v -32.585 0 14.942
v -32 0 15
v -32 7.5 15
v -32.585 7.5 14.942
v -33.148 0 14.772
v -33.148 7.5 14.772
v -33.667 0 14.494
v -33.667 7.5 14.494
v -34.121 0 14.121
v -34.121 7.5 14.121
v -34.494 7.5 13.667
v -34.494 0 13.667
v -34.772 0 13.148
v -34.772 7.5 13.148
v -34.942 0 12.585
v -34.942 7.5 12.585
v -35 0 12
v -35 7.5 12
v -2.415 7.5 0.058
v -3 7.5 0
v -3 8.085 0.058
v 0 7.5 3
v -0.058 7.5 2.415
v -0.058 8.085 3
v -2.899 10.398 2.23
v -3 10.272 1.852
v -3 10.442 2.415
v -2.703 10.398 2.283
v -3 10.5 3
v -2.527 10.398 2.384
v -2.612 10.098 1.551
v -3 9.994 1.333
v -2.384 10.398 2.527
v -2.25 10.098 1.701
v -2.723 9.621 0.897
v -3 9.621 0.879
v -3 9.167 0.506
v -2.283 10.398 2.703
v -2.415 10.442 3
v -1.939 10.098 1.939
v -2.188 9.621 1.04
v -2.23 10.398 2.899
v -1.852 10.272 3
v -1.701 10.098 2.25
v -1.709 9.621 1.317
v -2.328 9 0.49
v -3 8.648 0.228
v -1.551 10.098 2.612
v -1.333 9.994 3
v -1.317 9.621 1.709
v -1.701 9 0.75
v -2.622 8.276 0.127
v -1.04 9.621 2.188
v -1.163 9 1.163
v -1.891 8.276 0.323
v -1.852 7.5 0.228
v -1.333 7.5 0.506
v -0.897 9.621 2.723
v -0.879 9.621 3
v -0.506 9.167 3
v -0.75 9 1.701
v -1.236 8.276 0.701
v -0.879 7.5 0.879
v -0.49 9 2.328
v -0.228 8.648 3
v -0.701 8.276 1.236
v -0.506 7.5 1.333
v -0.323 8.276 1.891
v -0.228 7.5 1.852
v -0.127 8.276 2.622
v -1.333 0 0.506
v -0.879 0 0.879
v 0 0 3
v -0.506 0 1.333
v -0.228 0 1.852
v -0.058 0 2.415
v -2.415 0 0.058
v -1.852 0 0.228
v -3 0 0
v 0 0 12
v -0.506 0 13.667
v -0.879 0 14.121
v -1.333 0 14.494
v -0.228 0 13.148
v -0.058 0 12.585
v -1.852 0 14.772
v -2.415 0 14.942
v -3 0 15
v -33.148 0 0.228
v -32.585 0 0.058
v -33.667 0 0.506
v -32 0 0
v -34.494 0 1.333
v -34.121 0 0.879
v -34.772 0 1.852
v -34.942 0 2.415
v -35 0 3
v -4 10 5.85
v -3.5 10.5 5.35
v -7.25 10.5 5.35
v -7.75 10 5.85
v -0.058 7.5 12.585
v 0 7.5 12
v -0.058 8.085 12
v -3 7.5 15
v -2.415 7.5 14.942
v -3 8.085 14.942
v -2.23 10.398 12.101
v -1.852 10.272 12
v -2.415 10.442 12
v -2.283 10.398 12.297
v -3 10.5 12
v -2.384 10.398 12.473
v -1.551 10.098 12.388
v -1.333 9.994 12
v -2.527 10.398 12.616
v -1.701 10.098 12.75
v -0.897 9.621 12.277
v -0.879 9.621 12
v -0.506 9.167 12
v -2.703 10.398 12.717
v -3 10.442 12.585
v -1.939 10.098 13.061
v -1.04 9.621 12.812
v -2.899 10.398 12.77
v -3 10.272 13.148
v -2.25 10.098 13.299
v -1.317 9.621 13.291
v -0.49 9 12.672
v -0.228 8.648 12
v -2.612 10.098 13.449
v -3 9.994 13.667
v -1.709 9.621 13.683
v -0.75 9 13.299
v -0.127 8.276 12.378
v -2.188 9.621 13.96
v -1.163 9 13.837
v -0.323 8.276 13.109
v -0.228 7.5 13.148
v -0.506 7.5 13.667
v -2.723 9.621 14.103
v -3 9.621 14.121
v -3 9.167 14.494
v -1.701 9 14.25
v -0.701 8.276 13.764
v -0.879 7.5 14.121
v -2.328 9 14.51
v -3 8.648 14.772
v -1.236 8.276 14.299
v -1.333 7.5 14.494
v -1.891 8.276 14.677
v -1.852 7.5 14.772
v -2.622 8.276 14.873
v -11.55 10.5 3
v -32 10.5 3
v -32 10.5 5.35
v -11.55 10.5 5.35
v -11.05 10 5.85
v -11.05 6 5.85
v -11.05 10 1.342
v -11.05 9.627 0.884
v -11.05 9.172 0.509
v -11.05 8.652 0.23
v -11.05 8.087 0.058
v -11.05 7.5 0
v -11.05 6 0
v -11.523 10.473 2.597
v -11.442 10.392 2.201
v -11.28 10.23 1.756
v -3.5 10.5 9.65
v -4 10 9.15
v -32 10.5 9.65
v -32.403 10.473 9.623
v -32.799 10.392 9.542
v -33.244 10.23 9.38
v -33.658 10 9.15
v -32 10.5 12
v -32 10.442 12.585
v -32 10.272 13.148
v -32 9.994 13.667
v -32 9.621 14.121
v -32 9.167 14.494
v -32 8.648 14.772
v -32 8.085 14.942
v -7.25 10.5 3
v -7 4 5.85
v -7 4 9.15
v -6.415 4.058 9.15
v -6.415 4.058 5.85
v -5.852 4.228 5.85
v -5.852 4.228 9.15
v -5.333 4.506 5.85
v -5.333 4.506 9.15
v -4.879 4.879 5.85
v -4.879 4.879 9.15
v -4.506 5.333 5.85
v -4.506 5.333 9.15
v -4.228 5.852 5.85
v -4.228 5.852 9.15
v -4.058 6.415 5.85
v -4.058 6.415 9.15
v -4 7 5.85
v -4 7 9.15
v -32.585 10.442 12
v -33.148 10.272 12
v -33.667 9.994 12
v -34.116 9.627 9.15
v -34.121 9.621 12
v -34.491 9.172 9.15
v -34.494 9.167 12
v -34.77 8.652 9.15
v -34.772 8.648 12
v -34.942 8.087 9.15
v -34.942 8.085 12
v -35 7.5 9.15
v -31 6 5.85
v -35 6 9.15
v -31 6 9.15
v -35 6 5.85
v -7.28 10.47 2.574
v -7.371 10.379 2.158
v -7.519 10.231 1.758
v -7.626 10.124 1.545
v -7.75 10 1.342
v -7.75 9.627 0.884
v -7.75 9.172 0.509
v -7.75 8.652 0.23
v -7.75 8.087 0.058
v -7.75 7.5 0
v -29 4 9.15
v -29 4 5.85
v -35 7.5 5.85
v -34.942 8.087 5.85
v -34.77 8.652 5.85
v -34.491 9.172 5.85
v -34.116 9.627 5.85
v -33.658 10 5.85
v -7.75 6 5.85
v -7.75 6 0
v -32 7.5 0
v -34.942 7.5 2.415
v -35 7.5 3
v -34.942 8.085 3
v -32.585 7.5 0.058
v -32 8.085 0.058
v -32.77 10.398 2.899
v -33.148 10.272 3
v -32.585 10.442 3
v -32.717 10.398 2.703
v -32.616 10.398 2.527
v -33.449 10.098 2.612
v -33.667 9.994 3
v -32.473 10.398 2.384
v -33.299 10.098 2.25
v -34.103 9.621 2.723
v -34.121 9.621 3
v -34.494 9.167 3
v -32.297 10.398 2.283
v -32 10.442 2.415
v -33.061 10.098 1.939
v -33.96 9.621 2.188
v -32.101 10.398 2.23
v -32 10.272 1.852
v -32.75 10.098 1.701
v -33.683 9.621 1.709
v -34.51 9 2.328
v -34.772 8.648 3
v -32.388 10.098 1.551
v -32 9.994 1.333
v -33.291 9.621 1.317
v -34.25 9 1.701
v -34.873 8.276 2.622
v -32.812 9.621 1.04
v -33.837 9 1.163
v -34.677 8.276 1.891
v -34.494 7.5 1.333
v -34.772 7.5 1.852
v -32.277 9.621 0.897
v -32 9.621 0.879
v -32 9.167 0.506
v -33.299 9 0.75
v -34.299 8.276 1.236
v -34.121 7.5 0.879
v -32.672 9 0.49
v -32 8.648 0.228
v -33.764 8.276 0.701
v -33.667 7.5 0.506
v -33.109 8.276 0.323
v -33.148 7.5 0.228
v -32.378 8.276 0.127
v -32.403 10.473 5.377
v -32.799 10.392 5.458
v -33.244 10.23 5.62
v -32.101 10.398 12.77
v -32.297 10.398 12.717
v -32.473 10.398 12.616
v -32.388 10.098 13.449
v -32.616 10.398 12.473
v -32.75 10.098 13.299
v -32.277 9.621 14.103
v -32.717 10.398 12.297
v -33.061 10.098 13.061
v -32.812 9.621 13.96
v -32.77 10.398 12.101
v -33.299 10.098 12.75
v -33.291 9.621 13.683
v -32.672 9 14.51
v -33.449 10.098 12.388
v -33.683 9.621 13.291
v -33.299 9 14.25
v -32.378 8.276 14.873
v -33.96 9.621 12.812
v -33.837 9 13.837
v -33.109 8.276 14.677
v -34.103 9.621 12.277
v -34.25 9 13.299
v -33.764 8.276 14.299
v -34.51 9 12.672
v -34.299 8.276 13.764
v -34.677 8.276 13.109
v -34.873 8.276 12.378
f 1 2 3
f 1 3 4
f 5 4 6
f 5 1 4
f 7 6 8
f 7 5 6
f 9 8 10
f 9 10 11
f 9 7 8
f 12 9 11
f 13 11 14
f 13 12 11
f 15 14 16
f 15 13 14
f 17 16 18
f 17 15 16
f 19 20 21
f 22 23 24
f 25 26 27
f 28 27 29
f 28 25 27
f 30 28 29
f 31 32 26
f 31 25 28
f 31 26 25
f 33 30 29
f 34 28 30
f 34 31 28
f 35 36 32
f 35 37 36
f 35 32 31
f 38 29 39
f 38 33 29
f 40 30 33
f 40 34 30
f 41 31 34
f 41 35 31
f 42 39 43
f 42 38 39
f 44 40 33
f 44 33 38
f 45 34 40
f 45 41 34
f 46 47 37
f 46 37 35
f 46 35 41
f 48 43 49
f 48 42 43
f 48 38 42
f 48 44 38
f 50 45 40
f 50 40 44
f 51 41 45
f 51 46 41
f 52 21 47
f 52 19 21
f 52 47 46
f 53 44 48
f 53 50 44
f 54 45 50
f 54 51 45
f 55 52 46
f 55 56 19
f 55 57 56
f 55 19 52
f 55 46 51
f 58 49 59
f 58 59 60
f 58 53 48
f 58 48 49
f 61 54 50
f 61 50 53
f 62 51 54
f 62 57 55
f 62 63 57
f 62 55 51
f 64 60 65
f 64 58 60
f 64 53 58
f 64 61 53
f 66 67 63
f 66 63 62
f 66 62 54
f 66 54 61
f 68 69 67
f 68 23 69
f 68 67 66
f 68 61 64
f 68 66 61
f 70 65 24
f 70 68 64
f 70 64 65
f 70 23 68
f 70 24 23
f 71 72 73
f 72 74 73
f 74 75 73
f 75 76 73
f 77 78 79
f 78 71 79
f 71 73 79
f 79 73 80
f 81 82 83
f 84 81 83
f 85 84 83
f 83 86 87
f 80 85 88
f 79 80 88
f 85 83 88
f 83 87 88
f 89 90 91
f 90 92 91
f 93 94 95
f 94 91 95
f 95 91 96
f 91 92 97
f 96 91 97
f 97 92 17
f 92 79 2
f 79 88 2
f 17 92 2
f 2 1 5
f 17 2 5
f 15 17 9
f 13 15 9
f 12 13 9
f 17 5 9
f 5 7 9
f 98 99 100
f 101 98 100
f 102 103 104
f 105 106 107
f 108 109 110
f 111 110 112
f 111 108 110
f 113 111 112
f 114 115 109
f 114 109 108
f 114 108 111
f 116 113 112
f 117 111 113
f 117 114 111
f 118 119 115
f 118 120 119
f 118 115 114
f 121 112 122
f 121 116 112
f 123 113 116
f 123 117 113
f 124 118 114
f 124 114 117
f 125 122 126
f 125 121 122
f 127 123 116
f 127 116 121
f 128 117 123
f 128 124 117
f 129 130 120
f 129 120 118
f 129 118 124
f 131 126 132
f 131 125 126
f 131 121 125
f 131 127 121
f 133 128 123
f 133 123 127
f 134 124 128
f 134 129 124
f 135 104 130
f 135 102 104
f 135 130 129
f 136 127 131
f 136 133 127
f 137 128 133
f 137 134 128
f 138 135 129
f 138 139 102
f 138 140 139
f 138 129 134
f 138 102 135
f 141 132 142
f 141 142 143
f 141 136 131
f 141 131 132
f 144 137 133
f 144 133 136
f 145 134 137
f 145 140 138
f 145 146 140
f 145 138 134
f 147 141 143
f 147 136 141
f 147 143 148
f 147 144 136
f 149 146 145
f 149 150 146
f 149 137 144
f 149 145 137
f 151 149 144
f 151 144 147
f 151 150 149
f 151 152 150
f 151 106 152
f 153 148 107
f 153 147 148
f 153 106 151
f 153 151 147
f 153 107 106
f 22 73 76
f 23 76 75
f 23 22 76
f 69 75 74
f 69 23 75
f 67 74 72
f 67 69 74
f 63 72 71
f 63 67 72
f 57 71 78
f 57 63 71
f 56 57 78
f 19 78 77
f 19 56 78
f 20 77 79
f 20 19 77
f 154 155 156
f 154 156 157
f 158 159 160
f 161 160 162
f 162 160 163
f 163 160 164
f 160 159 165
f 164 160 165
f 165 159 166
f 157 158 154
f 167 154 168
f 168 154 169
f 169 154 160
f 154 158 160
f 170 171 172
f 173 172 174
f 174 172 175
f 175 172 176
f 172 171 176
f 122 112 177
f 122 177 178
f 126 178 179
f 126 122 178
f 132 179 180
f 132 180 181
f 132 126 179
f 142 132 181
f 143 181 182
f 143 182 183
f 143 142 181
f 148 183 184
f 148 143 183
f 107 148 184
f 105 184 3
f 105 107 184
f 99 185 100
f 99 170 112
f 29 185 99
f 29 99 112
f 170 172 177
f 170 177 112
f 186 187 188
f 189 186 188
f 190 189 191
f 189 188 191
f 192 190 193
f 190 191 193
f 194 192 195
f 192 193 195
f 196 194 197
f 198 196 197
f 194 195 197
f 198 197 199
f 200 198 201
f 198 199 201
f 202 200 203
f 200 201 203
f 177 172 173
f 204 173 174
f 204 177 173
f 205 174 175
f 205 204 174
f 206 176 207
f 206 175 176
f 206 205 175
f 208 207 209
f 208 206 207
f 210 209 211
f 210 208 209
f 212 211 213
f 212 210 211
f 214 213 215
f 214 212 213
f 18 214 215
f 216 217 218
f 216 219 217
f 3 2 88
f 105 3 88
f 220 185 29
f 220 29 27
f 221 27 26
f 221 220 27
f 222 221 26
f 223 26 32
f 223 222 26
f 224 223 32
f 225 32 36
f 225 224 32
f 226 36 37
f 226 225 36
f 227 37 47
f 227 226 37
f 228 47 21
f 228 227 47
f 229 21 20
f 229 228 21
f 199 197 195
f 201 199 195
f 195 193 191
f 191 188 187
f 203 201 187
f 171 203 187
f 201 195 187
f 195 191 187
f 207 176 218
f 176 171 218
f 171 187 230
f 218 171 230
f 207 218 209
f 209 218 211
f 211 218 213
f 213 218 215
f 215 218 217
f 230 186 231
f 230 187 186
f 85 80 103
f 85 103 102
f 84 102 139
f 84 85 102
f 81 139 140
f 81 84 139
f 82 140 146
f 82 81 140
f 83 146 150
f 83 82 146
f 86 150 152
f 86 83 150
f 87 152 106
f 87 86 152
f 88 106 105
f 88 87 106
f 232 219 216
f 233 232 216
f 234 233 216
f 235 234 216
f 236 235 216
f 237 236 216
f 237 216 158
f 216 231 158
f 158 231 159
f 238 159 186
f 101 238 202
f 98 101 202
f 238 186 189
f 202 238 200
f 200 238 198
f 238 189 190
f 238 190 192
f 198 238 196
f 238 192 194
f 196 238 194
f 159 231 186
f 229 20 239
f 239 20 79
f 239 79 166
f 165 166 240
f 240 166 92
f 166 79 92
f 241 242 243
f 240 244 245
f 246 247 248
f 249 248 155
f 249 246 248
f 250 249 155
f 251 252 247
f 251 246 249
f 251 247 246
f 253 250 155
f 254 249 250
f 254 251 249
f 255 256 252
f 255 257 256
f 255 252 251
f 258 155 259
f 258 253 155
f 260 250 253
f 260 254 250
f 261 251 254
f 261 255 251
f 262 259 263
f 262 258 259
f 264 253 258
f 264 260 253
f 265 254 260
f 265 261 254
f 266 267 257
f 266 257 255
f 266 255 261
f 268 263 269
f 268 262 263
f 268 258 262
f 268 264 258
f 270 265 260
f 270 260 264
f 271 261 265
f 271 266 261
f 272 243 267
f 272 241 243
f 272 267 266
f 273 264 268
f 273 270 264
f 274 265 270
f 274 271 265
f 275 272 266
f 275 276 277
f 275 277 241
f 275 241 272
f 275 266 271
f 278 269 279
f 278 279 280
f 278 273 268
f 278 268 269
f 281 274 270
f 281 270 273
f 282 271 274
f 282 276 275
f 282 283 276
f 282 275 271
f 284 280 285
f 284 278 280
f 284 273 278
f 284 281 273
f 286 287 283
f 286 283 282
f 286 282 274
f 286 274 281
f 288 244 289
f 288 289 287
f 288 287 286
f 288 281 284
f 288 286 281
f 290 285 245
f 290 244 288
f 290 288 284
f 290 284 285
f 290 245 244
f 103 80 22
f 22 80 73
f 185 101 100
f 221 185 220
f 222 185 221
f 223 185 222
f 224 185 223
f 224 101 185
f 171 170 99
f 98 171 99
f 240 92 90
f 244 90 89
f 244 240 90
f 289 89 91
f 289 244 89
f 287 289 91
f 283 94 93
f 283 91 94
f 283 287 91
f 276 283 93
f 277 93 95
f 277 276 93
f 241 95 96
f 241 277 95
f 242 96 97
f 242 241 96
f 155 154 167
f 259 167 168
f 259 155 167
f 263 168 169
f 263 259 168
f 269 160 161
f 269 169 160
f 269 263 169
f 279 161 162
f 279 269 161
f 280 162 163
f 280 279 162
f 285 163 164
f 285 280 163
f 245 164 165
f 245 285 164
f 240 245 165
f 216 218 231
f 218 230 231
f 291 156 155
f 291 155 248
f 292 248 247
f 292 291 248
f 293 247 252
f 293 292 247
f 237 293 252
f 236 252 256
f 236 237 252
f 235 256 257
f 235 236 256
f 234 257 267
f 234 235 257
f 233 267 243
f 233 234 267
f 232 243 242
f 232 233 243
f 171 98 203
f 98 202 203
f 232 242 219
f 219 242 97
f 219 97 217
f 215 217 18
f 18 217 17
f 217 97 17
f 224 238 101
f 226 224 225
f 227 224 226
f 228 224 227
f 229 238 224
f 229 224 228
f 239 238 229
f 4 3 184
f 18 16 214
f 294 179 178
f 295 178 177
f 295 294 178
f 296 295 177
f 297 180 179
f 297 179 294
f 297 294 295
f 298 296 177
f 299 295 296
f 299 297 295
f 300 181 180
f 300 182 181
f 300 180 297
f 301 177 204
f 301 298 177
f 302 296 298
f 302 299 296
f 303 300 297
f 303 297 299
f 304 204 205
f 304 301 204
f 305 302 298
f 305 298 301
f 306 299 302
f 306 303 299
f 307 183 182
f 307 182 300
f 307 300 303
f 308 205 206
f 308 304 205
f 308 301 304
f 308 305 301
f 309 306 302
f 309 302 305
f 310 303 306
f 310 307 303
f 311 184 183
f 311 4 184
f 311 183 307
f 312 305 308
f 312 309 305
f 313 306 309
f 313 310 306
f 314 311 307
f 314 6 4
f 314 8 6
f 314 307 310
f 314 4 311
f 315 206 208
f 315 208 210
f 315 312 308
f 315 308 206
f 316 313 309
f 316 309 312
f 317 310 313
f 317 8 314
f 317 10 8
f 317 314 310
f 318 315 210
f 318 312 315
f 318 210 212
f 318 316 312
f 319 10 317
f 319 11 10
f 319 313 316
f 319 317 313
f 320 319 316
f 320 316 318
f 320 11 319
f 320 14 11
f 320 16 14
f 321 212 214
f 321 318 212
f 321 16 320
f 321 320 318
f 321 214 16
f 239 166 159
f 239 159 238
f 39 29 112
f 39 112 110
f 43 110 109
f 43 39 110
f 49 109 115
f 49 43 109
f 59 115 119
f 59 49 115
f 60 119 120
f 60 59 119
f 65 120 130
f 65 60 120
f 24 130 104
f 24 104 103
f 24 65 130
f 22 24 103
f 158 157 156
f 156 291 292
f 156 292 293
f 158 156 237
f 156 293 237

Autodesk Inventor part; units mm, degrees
ref_plane "YZ Plane" through (0, 0, 0) normal (1, 0, 0) x (0, 1, 0)
ref_plane "XZ Plane" through (0, 0, 0) normal (0, 1, 0) x (-1, 0, 0)
ref_plane "XY Plane" through (0, 0, 0) normal (0, 0, 1) x (1, 0, 0)
sketch "Sketch1" plane through (0, 0, 0) normal (0, 1, 0) x (-1, 0, 0)
  line L0 (0, 0) -> (35, 0)
  line L1 (35, 0) -> (35, 15)
  line L2 (35, 15) -> (0, 15)
  line L3 (0, 15) -> (0, 0)
  dimension "d0" = 35
  dimension "d1" = 15
extrude "Extrusion1" add sketch "Sketch1" along normal blind 4
sketch "Sketch2" plane through (0, 4, 0) normal (0, 1, 0) x (1, 0, 0)
  line L0 (0, 0) -> (-35, 0) projected
  line L1 (-35, 0) -> (-35, -15) projected
  line L2 (-35, -15) -> (0, -15) projected
  line L3 (0, -15) -> (0, 0) projected
  line L4 (-35, -5.85) -> (-31, -5.85)
  line L5 (-35, -9.15) -> (0, -9.15)
  line L6 (-17.5, -15) -> (-17.5, -9.15) construction
  line L7 (-17.5, -5.85) -> (-17.5, 0) construction
  line L8 (-31, -5.85) -> (-31, -9.15)
  line L9 (-4, -5.85) -> (-4, -9.15)
  line L10 (-4, -5.85) -> (0, -5.85)
  line L11 (-31, -5.85) -> (-4, -5.85)
  dimension "d4" = 3.3
  dimension "d7" = 27
extrude "Extrusion2" add sketch "Sketch2" along normal blind 2 contours L3 L10 L11 L4 L1 L0 | L3 L5 L9 L10 | L4 L8 L5 L1 | L3 L2 L1 L5
sketch "Sketch3" plane through (0, 6, 0) normal (0, 1, 0) x (1, 0, 0)
  line L0 (0, -15) -> (0, 0) projected
  line L1 (0, 0) -> (-35, 0) projected
  line L2 (-35, 0) -> (-35, -15) projected
  line L3 (-35, -15) -> (0, -15) projected
  line L4 (-4, -9.15) -> (-31, -9.15) projected
  line L5 (-31, -9.15) -> (-31, -5.85) projected
  line L6 (-31, -5.85) -> (-4, -5.85) projected
  line L7 (-4, -5.85) -> (-4, -9.15) projected
  line L8 (-31, -5.85) -> (-35, -5.85)
  line L9 (-31, -9.15) -> (-35, -9.15)
  line L10 (-7.75, -5.85) -> (-7.75, 0)
  line L11 (-11.05, -5.85) -> (-11.05, 0)
  line L12 (-11.05, -2.925) -> (-7.75, -2.925) construction
  dimension "d16" = 3.75
extrude "Extrusion3" add sketch "Sketch3" along normal blind 4.5 contours L3 L2 L9 L4 L7 L6 L10 L1 L0 | L11 L6 L8 L2 L1
chamfer "Chamfer3" distance 2 angle 45 1 edges at (-31, 4, 7.5)
fillet "Fillet3" radius 3 1 edges at (-4, 4, 7.5)
chamfer "Chamfer2" distance 0.5 angle 45 6 edges at (-19.5, 10.5, 9.15) (-23.025, 10.5, 5.85) (-5.875, 10.5, 5.85) (-4, 10.5, 7.5) (-7.75, 10.5, 2.925) (-11.05, 10.5, 2.925)
fillet "Fillet2" radius 3 10 edges at (0, 5.25, 15) (0, 5.25, 0) (-35, 5.25, 15) (-35, 5.25, 0) (-3.625, 10.5, 0) (0, 10.5, 7.5) (-17.5, 10.5, 15) (-23.275, 10.5, 0) (-35, 10.5, 2.675) (-35, 10.5, 12.325)
properties part number "Apoyo frontal"
